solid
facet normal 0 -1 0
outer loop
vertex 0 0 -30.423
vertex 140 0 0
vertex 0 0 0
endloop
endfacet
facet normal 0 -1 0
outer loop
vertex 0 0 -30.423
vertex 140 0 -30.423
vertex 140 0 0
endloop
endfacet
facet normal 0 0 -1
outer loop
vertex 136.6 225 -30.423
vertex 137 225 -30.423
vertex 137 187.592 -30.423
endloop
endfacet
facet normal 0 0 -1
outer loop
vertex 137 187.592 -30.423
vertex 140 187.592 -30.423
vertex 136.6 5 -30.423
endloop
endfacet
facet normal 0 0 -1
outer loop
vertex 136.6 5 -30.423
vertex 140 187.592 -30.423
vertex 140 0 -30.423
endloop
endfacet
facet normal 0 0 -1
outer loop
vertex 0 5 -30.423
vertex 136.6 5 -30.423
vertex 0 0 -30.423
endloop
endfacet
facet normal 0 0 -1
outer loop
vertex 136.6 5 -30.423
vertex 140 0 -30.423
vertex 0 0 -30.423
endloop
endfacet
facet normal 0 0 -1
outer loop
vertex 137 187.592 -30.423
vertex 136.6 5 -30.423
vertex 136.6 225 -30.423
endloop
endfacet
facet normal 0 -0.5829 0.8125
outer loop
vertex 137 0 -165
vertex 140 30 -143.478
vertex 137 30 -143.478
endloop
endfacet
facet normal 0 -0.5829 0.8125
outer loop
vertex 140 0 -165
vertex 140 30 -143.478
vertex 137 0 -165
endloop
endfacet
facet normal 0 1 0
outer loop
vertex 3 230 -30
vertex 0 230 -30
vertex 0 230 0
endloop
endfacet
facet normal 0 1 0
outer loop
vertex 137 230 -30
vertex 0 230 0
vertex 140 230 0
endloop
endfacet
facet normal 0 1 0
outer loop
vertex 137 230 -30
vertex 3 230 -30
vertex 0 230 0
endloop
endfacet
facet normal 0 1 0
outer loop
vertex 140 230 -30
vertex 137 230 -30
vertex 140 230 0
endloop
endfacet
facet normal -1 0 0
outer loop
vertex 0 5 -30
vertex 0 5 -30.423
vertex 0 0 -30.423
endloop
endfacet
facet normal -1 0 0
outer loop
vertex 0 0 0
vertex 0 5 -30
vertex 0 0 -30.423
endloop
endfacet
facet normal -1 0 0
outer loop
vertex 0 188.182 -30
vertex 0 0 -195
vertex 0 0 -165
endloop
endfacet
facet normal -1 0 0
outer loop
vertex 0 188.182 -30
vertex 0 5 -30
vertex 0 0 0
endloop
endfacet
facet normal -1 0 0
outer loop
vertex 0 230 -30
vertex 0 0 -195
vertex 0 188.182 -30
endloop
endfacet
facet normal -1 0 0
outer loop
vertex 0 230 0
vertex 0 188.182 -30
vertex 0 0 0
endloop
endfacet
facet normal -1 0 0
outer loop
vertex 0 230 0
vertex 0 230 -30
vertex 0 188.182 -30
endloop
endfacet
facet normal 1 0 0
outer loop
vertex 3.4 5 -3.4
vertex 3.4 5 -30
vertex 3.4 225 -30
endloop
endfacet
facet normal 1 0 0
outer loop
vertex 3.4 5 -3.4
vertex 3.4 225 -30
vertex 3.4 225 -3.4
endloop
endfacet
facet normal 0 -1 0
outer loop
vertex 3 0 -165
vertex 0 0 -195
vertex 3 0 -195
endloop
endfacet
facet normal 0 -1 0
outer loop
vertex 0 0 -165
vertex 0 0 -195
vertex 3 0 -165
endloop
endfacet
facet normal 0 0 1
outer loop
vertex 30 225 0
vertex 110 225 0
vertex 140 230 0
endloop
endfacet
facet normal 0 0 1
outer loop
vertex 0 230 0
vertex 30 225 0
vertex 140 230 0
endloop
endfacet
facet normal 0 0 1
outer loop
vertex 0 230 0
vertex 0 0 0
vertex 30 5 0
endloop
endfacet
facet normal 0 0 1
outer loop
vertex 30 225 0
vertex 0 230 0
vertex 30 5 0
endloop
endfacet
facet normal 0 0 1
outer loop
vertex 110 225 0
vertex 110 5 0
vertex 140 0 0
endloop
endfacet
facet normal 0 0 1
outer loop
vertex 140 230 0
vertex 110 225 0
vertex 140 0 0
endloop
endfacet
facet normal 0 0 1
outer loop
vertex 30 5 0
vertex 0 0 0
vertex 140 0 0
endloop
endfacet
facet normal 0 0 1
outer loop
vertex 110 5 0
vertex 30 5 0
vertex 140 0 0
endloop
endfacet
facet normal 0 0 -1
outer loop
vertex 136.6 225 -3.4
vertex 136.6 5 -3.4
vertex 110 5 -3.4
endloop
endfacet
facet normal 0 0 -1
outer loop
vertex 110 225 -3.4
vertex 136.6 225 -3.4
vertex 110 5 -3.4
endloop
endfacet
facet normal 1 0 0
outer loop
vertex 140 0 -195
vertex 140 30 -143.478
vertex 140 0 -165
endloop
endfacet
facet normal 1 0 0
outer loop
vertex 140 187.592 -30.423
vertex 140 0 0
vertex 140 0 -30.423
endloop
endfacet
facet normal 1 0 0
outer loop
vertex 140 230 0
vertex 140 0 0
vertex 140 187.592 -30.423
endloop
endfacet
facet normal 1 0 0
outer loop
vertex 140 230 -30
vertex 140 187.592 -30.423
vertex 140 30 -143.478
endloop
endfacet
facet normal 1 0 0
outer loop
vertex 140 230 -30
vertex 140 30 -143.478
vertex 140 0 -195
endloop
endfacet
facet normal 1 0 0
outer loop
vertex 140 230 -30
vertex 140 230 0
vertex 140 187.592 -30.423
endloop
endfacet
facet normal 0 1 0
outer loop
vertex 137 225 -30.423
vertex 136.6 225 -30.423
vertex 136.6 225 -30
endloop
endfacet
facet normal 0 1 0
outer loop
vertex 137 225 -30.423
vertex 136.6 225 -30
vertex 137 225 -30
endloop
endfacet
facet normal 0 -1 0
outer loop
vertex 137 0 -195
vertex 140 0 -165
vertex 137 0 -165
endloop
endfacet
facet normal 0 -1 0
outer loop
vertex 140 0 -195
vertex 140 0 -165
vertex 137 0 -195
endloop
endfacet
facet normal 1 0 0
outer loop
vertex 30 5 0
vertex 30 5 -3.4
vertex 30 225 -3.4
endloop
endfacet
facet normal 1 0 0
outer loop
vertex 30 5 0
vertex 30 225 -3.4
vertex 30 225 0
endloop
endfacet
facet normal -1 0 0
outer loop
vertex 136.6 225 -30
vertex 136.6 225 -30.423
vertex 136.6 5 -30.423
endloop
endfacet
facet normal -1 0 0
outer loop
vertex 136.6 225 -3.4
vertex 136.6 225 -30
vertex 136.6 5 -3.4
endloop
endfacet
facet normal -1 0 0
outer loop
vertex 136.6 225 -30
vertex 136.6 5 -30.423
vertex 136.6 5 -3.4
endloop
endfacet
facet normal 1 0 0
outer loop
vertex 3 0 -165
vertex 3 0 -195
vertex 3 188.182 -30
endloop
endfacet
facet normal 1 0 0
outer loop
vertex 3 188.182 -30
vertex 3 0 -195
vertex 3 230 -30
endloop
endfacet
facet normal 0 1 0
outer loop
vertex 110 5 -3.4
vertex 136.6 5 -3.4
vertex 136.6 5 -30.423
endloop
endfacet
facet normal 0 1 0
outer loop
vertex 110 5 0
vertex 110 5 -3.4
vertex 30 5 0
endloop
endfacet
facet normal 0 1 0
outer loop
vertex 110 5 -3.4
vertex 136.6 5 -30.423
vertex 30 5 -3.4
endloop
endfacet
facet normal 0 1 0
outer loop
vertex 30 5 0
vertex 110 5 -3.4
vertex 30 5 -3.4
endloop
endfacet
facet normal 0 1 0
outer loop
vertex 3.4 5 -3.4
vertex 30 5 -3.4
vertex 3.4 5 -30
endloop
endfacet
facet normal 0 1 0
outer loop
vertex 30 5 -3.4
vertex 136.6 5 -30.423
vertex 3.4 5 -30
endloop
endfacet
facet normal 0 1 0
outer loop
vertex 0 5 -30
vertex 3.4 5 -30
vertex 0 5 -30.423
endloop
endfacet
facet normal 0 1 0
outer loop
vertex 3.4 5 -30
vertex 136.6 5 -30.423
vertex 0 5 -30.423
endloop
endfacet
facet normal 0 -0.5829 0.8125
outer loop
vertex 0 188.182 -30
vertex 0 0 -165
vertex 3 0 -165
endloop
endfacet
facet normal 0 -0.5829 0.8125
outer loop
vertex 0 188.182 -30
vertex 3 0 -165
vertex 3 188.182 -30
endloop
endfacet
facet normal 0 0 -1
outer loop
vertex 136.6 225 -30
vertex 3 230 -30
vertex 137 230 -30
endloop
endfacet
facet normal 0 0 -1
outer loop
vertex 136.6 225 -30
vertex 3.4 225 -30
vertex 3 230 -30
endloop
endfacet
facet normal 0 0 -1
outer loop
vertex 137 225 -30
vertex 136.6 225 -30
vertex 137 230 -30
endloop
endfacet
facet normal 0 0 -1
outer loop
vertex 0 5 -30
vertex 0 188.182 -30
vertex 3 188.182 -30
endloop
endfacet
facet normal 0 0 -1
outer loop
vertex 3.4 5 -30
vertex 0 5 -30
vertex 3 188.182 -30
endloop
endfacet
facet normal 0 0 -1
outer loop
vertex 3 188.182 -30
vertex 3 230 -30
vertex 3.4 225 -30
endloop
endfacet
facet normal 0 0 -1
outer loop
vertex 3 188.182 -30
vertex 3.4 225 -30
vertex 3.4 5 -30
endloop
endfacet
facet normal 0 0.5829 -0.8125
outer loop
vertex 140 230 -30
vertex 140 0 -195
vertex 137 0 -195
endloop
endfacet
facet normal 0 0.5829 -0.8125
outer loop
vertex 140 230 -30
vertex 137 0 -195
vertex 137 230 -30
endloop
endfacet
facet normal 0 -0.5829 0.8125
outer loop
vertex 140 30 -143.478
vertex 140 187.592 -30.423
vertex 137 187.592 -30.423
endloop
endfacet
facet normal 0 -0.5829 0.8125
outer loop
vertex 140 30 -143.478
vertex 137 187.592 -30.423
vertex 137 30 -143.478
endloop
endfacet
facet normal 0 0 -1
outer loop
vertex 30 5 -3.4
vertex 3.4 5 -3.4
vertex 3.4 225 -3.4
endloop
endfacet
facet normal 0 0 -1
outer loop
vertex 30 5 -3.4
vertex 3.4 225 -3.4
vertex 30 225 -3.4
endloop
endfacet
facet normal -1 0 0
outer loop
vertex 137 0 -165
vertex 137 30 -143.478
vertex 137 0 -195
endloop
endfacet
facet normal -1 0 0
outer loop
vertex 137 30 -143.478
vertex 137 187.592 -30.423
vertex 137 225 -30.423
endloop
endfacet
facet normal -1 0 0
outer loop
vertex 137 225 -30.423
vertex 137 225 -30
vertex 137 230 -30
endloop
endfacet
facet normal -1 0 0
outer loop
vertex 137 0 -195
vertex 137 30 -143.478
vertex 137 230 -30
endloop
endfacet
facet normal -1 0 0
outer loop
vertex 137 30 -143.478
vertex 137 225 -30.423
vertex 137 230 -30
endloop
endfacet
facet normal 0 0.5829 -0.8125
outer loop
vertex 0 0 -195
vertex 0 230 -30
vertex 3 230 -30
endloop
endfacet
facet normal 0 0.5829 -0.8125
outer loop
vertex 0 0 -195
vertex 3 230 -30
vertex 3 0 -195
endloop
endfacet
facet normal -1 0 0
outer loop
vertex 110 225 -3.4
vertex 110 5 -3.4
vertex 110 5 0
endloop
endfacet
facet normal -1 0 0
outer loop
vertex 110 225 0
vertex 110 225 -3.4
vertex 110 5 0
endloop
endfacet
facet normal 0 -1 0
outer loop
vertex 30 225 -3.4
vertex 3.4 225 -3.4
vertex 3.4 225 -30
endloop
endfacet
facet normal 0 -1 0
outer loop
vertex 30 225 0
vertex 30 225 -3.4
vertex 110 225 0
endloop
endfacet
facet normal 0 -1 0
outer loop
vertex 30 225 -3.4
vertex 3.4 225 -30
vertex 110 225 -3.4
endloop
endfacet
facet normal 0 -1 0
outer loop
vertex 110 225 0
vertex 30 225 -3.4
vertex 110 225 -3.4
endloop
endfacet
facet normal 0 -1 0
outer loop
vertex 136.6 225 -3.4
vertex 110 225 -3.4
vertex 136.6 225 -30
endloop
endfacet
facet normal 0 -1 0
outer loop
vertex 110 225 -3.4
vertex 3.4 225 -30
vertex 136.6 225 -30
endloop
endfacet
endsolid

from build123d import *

# Parameters (mm, degrees)
BOSS_EXTRUDE1_DEPTH = 225
BOSS_EXTRUDE2_DEPTH = 5
BOSS_EXTRUDE3_DEPTH = 220
SKETCH4_W           = 140
SKETCH4_H           = 30
BOSS_EXTRUDE4_DEPTH = 5
BOSS_EXTRUDE5_DEPTH = 3
BOSS_EXTRUDE6_DEPTH = 3


with BuildPart() as part:
    # Sketch1 → Boss-Extrude1 (new body)
    with BuildSketch(Plane(origin=(0, 0, 0), x_dir=(1, 0, 0), z_dir=(0, 1, 0))):
        Polygon((0, 0), (0, 30), (3.4, 30), (3.4, 3.4), (30, 3.4), (30, 0), align=None)
    extrude(amount=BOSS_EXTRUDE1_DEPTH)

    # Sketch2 → Boss-Extrude2 (add)
    with BuildSketch(Plane(origin=(0, 0, 0), x_dir=(-1, 0, 0), z_dir=(0, -1, 0))):
        Polygon((-140, 0), (-30, 0), (-30, 3.4), (-3.4, 3.4), (-3.4, 30), (0, 30), (0, 30.423390593), (-140, 30.423390593), align=None)
    extrude(amount=-BOSS_EXTRUDE2_DEPTH)

    # Sketch3 → Boss-Extrude3 (add)
    with BuildSketch(Plane(origin=(0, 5, 0), x_dir=(1, 0, 0), z_dir=(0, 1, 0))):
        Polygon((140, 0), (140, 30.423390593), (136.6, 30.423390593), (136.6, 3.4), (110, 3.4), (110, 0), align=None)
    extrude(amount=BOSS_EXTRUDE3_DEPTH)

    # Sketch4 → Boss-Extrude4 (add)
    with BuildSketch(Plane(origin=(0, 225, 0), x_dir=(1, 0, 0), z_dir=(0, 1, 0))):
        with Locations((70, 15)):
            Rectangle(SKETCH4_W, SKETCH4_H)
    extrude(amount=BOSS_EXTRUDE4_DEPTH)

    # Sketch5 → Boss-Extrude5 (add)
    with BuildSketch(Plane(origin=(140, 0, 0), x_dir=(0, 0, -1), z_dir=(1, 0, 0))):
        Polygon((143.47826087, 30), (165, 0), (195, 0), (30, 230), (30, 225), (30.423390593, 225), (30.423390593, 187.591637355), align=None)
    extrude(amount=-BOSS_EXTRUDE5_DEPTH)

    # Sketch6 → Boss-Extrude6 (add)
    with BuildSketch(Plane.ZY):
        Polygon((-30, 230), (-195, 0), (-165, 0), (0, 230), align=None)
    extrude(amount=-BOSS_EXTRUDE6_DEPTH)


solid = part.part
